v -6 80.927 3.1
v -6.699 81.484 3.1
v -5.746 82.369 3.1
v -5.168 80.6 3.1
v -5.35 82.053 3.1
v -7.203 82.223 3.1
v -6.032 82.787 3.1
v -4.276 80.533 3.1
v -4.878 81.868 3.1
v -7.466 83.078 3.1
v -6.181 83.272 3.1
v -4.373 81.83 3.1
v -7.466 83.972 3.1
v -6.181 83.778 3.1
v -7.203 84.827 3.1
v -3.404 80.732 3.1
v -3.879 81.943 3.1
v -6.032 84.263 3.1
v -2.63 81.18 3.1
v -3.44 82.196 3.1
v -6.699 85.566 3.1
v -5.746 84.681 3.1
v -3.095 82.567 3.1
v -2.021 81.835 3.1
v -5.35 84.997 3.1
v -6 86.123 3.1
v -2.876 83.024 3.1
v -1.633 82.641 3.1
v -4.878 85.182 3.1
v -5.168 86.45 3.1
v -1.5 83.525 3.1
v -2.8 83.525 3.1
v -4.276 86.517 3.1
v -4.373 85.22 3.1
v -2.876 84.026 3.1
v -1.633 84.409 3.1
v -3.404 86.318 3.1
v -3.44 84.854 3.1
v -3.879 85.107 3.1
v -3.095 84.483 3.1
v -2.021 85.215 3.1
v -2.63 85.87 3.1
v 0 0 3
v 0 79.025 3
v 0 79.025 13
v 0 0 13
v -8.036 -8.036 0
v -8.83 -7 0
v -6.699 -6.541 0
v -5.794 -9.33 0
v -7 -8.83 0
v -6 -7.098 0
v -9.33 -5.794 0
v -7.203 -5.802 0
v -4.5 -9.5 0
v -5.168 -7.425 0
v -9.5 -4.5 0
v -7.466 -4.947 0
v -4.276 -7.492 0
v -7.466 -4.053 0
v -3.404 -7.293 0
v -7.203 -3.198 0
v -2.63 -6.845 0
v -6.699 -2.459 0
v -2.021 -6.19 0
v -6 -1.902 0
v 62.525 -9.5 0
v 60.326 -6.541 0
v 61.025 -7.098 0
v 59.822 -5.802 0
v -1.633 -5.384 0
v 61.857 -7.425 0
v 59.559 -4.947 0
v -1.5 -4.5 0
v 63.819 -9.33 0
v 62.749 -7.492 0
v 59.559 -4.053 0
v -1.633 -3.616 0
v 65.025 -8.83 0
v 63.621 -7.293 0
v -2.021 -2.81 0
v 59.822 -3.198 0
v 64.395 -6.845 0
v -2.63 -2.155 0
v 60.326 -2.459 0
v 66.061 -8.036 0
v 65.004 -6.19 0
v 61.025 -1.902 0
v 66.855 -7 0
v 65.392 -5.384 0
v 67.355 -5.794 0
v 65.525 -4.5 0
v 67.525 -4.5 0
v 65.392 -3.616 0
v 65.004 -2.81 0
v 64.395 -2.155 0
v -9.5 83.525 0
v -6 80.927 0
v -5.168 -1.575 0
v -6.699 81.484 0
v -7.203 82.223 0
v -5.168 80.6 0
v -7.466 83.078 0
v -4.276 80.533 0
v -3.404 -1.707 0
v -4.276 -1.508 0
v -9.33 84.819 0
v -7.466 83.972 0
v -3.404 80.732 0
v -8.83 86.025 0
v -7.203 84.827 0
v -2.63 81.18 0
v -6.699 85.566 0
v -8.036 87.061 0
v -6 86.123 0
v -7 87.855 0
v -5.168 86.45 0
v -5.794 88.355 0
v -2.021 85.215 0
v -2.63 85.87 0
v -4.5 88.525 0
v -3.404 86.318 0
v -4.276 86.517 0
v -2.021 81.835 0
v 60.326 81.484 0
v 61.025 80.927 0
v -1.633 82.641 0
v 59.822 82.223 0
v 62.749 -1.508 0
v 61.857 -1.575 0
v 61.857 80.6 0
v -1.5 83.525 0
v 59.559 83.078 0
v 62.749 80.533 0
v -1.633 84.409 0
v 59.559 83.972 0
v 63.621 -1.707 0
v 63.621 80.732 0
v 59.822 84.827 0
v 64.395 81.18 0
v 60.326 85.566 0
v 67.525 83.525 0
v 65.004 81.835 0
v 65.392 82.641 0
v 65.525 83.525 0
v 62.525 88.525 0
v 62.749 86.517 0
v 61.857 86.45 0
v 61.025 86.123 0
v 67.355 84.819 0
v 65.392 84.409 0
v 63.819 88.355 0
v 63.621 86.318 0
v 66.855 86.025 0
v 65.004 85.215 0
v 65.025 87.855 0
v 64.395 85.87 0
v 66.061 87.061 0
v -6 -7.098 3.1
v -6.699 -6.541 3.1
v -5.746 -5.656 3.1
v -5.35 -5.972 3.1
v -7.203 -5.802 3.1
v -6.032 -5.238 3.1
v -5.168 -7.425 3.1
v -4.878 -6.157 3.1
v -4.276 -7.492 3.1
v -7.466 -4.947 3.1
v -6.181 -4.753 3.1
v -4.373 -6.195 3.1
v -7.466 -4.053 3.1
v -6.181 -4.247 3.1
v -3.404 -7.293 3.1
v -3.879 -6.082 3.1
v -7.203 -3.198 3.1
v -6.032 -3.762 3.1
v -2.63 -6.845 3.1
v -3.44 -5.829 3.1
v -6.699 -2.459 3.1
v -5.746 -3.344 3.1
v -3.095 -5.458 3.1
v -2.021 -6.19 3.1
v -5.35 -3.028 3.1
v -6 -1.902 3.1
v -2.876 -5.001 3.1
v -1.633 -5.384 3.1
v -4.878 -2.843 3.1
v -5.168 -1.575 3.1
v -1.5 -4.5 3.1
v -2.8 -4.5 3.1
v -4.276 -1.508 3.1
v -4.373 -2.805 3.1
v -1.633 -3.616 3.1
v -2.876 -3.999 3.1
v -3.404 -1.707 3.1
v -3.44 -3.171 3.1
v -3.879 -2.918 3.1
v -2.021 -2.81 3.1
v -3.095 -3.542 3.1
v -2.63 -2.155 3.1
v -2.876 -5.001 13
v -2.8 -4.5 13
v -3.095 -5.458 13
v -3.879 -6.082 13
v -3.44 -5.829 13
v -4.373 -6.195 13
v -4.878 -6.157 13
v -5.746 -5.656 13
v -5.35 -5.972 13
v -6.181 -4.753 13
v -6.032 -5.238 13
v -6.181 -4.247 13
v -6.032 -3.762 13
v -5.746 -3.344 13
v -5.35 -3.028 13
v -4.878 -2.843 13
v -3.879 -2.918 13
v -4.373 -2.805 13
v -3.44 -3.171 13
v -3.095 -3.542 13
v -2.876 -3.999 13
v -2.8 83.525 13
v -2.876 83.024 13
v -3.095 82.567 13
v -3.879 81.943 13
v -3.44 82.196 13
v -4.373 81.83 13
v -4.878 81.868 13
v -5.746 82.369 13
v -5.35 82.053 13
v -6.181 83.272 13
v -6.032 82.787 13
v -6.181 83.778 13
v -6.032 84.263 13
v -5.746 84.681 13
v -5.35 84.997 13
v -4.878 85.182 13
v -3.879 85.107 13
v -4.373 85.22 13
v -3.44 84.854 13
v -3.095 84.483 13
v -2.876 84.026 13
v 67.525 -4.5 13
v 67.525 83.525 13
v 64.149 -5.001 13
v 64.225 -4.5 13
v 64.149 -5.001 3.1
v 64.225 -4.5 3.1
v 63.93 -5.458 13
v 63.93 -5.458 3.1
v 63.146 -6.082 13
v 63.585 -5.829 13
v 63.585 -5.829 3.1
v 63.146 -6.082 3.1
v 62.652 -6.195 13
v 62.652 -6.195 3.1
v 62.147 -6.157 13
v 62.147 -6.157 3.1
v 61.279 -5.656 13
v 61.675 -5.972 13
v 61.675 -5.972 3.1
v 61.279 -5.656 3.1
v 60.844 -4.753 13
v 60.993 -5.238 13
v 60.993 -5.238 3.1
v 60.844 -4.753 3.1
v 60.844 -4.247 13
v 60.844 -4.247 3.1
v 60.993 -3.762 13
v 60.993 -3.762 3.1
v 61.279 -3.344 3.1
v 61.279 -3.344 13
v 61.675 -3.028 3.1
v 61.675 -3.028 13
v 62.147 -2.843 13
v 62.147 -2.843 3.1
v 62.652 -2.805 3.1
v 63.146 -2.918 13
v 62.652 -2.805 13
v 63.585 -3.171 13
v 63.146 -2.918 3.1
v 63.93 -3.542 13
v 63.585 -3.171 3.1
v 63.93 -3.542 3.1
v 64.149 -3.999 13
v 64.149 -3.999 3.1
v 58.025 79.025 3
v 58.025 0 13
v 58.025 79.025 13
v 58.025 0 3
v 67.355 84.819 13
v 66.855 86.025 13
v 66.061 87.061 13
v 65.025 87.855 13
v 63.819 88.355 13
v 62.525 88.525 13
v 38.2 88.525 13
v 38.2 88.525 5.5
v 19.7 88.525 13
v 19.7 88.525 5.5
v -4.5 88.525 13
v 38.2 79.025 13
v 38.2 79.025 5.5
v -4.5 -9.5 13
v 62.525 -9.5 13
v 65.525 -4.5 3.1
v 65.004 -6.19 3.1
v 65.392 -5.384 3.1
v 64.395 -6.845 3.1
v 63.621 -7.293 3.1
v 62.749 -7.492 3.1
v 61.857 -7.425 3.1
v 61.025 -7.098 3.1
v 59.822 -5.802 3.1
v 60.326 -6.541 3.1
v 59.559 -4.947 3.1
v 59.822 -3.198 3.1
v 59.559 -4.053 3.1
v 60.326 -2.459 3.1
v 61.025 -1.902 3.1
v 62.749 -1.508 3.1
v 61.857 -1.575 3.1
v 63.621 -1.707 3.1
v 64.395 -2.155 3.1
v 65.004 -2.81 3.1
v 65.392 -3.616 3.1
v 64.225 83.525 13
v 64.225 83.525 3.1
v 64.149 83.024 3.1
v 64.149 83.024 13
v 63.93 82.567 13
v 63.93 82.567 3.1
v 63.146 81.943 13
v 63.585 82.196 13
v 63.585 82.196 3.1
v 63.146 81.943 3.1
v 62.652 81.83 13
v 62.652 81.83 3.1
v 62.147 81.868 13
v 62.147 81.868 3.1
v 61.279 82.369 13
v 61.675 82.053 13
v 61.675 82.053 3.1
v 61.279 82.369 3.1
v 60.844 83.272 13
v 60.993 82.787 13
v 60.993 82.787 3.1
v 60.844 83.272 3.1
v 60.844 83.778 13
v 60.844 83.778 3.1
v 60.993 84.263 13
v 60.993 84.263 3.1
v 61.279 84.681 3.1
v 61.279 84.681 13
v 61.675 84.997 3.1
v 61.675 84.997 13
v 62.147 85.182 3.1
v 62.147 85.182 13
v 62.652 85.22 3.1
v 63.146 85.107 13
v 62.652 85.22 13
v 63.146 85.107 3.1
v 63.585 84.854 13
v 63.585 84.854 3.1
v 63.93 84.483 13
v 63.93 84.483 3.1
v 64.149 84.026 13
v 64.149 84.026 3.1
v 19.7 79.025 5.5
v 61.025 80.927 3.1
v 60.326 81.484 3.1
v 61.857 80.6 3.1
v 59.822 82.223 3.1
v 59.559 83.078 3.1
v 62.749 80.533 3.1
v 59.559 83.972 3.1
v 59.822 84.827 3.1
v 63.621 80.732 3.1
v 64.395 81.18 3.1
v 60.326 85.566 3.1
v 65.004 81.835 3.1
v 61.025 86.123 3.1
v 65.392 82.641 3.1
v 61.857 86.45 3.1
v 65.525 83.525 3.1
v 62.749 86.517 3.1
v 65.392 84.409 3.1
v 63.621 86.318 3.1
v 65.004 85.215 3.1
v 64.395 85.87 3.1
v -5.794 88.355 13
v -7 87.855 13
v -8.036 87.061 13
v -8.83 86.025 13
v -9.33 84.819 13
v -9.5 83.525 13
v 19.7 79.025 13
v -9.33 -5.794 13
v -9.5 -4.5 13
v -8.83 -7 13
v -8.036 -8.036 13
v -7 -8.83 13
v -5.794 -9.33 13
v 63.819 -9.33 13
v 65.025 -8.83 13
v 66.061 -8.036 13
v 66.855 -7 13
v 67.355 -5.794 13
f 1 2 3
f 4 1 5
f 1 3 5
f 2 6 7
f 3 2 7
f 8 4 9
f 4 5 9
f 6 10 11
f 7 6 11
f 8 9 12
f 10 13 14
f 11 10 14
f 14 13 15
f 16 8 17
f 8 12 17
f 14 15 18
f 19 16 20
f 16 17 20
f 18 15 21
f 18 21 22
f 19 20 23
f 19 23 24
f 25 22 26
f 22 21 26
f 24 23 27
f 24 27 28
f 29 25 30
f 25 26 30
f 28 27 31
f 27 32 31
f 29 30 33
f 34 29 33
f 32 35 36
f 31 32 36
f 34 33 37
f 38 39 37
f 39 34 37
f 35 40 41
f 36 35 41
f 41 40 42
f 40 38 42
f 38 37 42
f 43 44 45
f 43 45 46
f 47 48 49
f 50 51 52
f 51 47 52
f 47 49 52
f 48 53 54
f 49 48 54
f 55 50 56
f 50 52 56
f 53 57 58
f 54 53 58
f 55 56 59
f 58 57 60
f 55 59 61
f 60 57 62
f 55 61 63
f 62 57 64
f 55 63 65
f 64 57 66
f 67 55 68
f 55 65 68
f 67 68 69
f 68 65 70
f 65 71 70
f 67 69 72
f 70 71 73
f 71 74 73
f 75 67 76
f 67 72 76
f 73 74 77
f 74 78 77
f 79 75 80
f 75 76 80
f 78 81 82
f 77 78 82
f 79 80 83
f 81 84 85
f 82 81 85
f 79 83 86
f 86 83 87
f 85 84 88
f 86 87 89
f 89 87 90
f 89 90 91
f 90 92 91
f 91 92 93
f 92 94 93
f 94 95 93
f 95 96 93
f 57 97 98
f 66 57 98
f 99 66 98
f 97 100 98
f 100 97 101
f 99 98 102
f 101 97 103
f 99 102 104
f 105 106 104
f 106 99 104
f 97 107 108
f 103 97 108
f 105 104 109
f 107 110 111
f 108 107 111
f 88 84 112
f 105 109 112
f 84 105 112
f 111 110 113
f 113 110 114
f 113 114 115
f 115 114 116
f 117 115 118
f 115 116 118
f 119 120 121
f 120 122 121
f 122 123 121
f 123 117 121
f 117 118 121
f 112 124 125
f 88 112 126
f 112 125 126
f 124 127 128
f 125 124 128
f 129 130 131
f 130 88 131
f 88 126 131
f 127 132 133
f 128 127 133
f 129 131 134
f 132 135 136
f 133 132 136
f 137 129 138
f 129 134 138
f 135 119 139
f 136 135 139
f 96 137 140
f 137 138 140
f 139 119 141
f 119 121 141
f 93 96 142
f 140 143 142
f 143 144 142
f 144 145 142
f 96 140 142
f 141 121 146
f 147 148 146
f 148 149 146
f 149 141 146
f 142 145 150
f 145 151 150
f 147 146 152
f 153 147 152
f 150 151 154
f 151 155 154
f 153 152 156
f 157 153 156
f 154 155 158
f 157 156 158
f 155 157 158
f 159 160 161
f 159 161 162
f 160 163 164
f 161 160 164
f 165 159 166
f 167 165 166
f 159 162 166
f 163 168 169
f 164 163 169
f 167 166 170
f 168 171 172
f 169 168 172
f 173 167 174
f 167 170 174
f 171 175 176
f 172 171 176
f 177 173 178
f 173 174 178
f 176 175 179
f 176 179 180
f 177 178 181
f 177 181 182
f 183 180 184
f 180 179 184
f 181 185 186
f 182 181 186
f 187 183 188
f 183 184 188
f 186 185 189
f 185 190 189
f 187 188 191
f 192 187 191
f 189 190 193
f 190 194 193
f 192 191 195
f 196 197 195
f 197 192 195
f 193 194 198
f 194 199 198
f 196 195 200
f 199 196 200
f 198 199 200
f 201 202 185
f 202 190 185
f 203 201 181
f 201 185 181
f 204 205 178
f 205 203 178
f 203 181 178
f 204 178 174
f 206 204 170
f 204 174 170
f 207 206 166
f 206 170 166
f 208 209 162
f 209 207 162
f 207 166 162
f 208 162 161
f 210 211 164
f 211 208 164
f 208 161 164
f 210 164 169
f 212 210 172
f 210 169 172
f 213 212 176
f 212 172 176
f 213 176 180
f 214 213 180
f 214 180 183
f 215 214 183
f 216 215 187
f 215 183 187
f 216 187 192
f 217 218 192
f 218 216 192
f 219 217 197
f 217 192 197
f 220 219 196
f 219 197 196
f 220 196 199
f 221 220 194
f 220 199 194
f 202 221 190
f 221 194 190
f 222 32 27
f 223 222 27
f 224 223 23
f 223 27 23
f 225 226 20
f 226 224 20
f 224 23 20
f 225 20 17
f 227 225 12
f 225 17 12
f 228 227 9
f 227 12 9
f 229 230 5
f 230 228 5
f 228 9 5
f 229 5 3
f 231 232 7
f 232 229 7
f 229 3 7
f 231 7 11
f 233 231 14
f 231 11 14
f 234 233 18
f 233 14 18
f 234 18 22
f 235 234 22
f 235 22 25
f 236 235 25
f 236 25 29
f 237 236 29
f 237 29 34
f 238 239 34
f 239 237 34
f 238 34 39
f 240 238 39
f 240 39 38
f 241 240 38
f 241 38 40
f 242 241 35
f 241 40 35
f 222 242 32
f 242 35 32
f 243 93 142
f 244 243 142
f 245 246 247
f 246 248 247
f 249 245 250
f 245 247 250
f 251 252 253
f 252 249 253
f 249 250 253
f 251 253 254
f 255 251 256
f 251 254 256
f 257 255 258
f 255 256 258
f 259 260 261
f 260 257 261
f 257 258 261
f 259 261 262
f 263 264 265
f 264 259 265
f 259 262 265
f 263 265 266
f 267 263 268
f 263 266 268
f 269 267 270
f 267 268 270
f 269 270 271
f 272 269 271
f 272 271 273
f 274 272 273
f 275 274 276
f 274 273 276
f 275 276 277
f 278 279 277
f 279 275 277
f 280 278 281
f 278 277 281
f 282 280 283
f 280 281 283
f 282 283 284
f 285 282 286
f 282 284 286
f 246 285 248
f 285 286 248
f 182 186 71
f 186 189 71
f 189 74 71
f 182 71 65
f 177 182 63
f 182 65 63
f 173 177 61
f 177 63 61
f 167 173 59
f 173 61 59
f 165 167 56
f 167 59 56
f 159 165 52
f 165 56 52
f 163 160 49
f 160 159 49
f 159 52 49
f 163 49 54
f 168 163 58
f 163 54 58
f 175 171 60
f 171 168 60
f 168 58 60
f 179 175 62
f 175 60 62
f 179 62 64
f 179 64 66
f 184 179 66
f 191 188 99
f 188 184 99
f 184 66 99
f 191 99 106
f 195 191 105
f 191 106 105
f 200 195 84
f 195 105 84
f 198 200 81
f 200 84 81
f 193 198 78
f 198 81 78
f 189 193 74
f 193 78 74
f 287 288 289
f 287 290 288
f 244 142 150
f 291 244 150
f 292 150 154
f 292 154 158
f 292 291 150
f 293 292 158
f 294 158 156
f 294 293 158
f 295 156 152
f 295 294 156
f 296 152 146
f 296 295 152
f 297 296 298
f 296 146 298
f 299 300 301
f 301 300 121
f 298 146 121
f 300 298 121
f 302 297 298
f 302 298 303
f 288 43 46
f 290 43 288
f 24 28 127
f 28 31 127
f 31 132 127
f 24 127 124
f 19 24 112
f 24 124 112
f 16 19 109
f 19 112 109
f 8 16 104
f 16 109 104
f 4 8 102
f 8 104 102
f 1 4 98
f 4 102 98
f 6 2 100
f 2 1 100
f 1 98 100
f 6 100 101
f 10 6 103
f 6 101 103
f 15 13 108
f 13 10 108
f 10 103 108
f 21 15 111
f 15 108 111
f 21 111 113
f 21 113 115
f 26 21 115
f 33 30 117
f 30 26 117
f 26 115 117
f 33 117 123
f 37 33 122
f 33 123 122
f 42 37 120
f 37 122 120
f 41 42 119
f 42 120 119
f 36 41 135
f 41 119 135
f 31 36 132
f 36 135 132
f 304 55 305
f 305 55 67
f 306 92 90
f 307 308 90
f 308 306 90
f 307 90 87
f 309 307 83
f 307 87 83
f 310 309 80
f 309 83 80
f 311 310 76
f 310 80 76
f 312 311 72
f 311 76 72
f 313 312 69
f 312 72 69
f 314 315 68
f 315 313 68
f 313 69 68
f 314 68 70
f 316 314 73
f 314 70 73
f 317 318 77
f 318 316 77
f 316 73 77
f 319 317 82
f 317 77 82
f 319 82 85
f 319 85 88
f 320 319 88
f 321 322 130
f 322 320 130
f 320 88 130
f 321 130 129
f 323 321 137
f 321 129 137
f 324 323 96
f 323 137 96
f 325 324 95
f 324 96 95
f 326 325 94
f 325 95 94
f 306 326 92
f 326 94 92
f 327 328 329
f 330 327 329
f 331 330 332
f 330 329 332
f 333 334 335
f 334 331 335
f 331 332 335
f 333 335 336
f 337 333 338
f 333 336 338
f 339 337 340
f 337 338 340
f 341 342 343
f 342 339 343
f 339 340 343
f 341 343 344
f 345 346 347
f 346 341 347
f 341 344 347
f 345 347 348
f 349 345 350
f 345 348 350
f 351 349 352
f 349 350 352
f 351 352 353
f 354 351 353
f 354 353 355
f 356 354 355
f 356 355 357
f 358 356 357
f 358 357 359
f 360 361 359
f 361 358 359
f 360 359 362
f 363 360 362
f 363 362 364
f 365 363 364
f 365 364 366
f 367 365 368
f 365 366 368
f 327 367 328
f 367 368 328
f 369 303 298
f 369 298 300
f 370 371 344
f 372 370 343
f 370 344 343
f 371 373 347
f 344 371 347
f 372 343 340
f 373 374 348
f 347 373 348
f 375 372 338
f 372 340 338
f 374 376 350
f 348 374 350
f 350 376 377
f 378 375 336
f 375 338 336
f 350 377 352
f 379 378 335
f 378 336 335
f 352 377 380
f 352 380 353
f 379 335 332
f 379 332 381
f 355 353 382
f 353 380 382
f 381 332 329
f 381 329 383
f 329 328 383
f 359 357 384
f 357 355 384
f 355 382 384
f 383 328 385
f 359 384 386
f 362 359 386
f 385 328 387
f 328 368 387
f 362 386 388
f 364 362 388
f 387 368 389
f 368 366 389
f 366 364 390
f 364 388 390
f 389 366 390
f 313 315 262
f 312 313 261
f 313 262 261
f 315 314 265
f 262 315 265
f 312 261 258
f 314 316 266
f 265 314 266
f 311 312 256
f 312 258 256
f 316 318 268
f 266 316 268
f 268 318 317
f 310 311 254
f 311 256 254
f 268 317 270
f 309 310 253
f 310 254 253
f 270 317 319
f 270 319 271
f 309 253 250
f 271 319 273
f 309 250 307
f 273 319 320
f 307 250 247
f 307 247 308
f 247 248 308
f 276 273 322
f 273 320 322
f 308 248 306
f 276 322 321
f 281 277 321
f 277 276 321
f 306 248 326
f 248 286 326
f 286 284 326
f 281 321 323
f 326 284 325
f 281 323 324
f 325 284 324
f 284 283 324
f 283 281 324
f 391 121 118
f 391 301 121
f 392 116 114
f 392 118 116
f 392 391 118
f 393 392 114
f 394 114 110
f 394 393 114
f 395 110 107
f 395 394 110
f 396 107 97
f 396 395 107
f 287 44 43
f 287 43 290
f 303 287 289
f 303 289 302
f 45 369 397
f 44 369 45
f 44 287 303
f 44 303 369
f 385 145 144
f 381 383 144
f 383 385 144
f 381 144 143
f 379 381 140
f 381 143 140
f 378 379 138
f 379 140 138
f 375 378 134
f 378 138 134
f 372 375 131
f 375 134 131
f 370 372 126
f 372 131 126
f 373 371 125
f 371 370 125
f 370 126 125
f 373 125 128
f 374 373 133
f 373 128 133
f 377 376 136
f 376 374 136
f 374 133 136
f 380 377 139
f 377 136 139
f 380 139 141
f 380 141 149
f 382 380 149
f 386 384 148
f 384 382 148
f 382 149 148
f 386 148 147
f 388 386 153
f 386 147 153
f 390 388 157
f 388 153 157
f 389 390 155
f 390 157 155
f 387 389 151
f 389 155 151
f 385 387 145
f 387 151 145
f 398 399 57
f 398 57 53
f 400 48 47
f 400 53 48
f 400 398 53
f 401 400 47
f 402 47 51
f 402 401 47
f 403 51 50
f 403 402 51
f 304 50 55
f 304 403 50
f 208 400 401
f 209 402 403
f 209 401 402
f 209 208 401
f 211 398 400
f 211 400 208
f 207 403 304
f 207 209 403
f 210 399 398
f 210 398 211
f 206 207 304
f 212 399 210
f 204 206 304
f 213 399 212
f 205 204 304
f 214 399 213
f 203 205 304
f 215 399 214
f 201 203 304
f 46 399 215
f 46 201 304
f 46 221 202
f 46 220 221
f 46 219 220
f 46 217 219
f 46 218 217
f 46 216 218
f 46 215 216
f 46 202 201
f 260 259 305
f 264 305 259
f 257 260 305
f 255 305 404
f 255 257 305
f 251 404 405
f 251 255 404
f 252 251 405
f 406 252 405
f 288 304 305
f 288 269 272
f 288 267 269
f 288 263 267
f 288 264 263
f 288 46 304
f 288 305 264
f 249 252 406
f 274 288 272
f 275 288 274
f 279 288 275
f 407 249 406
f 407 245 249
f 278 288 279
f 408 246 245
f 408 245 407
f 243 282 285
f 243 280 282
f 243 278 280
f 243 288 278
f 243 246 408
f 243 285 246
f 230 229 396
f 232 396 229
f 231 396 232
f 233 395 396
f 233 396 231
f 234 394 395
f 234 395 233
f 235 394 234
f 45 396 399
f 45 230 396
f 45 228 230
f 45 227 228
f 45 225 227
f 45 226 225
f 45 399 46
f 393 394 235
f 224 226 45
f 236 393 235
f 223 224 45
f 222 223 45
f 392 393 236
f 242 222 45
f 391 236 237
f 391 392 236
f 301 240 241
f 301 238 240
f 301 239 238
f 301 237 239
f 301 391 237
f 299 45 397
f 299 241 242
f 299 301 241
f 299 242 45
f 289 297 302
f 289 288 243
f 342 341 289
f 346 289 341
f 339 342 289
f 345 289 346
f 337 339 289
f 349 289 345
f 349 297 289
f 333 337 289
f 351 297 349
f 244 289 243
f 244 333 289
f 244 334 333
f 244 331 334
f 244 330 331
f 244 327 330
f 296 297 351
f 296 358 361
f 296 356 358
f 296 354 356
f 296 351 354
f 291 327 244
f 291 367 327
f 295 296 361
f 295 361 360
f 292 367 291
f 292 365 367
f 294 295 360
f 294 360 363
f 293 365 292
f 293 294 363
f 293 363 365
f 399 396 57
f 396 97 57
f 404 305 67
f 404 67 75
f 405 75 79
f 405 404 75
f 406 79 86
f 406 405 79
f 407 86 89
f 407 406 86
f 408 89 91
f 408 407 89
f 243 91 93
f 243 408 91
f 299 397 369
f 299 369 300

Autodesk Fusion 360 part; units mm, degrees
sketch "Sketch1" plane through (0, 0, 0) normal (0, 0, 1) x (1, 0, 0)
  line L0 (0, 0) -> (58.025, 0)
  line L1 (58.025, 0) -> (58.025, 79.025)
  line L2 (58.025, 79.025) -> (0, 79.025)
  line L3 (0, 79.025) -> (0, 0)
  line L4 (-9.5, -9.5) -> (67.525, -9.5)
  line L5 (67.525, -9.5) -> (67.525, 88.525)
  line L6 (67.525, 88.525) -> (-9.5, 88.525)
  line L7 (-9.5, 88.525) -> (-9.5, -9.5)
  circle A0 centre (-4.5, -4.5) radius 1.7
  circle A1 centre (-4.5, 83.525) radius 1.7
  circle A2 centre (62.525, 83.525) radius 1.7
  circle A3 centre (-4.5, -4.5) radius 3
  circle A4 centre (62.525, -4.5) radius 1.7
  circle A5 centre (62.525, -4.5) radius 3
  circle A6 centre (-4.5, 83.525) radius 3
  circle A7 centre (62.525, 83.525) radius 3
  dimension "d1" = 58.025
  dimension "d2" = 79.025
  dimension "d3" = 77.025
  dimension "d4" = 98.025
  dimension "d5" = 9.5
  dimension "d6" = 9.5
  dimension "d11" = 3.4
  dimension "d12" = 5
  dimension "d13" = 5
  dimension "d14" = 3.4
  dimension "d15" = 5
  dimension "d16" = 5
  dimension "d17" = 3.4
  dimension "d18" = 5
  dimension "d19" = 5
  dimension "d20" = 6
  dimension "d21" = 3.4
  dimension "d22" = 5
  dimension "d23" = 5
  dimension "d24" = 6
  dimension "d25" = 6
  dimension "d26" = 6
extrude "Extrude1" add sketch "Sketch1" along normal blind 9.9 from surface at 3.1 contours A3 | A5 | A6 | A7 makes body 1 at (59.7606, 82.3597, 9.7) makes body 2 at (-1.5037, -4.6495, 9.7) makes body 3 at (-7.0599, 81.9607, 9.7) makes body 4 at (65.5213, -4.6495, 9.7)
extrude "Extrude2" add sketch "Sketch1" along normal blind 13 contours L4 L5 L6 L7 bodies 1 2 3 4
extrude "Extrude3" add sketch "Sketch1" along normal blind 3 contours L0 L1 L2 L3 bodies 1
sketch "Sketch3" plane through (0, 0, 13) normal (0, 0, 1) x (-1, 0, 0)
  circle A0 centre (-62.525, -83.525) radius 1.7
  circle A1 centre (-62.525, 4.5) radius 1.7
  line L0 (0, 0) -> (0, -79.025)
  line L1 (0, -79.025) -> (-58.025, -79.025)
  line L2 (-58.025, -79.025) -> (-58.025, 0)
  line L3 (-58.025, 0) -> (0, 0)
  line L4 (9.5, -88.525) -> (9.5, 9.5)
  line L5 (9.5, 9.5) -> (-67.525, 9.5)
  line L6 (-67.525, 9.5) -> (-67.525, -88.525)
  line L7 (-67.525, -88.525) -> (9.5, -88.525)
  circle A2 centre (4.5, 4.5) radius 1.7
  circle A3 centre (4.5, -83.525) radius 1.7
  line L8 (-19.7, -88.525) -> (-38.2, -88.525)
  line L9 (-38.2, -88.525) -> (-38.2, -79.025)
  line L10 (-38.2, -79.025) -> (-19.7, -79.025)
  line L11 (-19.7, -79.025) -> (-19.7, -88.525)
  line L12 (9.5, -88.525) -> (9.5, 9.5)
  dimension "d36" = 18.5
  dimension "d37" = 29.2
extrude "Extrude4" cut sketch "Sketch3" against normal blind 7.5 contours L1 L7 L8 L9 L10 L11 bodies 1
fillet "Fillet1" radius 5 1 edges at (67.525, -9.5, 6.5) on bodies 1
fillet "Fillet2" radius 5 3 edges at (-9.5, -9.5, 6.5) (67.525, 88.525, 6.5) (-9.5, 88.525, 6.5) on bodies 1
